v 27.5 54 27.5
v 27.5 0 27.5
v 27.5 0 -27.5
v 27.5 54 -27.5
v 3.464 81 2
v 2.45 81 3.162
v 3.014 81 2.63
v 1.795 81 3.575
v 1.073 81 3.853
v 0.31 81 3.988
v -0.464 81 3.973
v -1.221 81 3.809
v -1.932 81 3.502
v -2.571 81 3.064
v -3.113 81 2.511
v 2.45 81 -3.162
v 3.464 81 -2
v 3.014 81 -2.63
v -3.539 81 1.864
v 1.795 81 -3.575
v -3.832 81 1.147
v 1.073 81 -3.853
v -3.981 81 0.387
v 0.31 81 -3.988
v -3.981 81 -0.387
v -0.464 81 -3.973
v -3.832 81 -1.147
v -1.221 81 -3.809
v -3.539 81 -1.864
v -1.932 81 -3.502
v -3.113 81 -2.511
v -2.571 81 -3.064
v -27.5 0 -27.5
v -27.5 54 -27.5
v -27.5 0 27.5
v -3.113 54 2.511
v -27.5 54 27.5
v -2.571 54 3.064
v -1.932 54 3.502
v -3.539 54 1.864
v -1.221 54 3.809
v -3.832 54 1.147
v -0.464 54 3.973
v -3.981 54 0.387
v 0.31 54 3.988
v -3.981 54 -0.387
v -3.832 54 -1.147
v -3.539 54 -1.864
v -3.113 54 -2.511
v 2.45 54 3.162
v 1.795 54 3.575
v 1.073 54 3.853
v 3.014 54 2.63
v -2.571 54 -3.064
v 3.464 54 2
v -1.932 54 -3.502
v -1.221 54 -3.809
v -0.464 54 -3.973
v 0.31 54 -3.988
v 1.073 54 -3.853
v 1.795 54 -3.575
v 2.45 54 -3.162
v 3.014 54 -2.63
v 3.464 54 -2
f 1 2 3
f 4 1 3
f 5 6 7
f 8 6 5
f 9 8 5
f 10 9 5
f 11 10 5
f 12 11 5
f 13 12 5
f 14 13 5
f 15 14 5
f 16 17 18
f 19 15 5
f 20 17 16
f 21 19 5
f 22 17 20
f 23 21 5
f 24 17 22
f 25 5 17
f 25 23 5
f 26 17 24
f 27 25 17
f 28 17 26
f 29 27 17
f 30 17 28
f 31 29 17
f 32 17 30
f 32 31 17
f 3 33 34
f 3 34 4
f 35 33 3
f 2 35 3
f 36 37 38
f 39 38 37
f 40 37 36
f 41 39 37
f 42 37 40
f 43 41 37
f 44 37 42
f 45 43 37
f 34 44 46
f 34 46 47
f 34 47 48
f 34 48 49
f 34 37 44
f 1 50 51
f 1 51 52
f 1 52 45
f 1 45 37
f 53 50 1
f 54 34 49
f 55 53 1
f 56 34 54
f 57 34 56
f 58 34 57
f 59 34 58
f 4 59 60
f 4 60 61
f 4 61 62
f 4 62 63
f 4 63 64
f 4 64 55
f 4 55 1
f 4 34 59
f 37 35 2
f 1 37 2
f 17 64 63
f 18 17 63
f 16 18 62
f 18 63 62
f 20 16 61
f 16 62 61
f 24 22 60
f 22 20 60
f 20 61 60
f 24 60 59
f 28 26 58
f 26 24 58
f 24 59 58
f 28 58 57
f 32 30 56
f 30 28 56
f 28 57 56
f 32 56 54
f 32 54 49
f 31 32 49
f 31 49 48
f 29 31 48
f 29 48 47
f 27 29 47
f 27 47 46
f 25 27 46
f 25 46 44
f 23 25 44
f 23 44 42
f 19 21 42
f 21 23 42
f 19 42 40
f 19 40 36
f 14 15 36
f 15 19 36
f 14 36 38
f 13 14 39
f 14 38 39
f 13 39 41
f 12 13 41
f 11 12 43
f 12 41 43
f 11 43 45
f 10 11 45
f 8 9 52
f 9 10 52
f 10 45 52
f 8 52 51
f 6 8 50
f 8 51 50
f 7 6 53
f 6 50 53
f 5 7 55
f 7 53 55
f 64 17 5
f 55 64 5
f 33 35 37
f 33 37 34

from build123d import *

# Parameters (mm, degrees)
SKETCH1_W           = 55
SKETCH1_H           = 55
BOSS_EXTRUDE1_DEPTH = 54
SKETCH2_R           = 4
BOSS_EXTRUDE2_DEPTH = 27
CUT_EXTRUDE1_DEPTH  = 27


with BuildPart() as part:
    # Sketch1 → Boss-Extrude1 (new body)
    with BuildSketch(Plane(origin=(0, 0, 0), x_dir=(1, 0, 0), z_dir=(0, 1, 0))):
        Rectangle(SKETCH1_W, SKETCH1_H)
    extrude(amount=BOSS_EXTRUDE1_DEPTH)

    # Sketch2 → Boss-Extrude2 (add)
    with BuildSketch(Plane(origin=(0, 54, 0), x_dir=(1, 0, 0), z_dir=(0, 1, 0))):
        with Locations(Location((0, 0, 0), (0, 0, 90))):
            Circle(SKETCH2_R)
    extrude(amount=BOSS_EXTRUDE2_DEPTH)

    # Sketch3 → Cut-Extrude1 (cut)
    with BuildSketch(Plane(origin=(0, 81, 0), x_dir=(1, 0, 0), z_dir=(0, 1, 0))):
        Polygon((3.464101615, 2), (3.464101615, -2), (4.924902358, -3.067380236), (7.380842693, 1.390151472), align=None)
    extrude(amount=-CUT_EXTRUDE1_DEPTH, mode=Mode.SUBTRACT)


solid = part.part
